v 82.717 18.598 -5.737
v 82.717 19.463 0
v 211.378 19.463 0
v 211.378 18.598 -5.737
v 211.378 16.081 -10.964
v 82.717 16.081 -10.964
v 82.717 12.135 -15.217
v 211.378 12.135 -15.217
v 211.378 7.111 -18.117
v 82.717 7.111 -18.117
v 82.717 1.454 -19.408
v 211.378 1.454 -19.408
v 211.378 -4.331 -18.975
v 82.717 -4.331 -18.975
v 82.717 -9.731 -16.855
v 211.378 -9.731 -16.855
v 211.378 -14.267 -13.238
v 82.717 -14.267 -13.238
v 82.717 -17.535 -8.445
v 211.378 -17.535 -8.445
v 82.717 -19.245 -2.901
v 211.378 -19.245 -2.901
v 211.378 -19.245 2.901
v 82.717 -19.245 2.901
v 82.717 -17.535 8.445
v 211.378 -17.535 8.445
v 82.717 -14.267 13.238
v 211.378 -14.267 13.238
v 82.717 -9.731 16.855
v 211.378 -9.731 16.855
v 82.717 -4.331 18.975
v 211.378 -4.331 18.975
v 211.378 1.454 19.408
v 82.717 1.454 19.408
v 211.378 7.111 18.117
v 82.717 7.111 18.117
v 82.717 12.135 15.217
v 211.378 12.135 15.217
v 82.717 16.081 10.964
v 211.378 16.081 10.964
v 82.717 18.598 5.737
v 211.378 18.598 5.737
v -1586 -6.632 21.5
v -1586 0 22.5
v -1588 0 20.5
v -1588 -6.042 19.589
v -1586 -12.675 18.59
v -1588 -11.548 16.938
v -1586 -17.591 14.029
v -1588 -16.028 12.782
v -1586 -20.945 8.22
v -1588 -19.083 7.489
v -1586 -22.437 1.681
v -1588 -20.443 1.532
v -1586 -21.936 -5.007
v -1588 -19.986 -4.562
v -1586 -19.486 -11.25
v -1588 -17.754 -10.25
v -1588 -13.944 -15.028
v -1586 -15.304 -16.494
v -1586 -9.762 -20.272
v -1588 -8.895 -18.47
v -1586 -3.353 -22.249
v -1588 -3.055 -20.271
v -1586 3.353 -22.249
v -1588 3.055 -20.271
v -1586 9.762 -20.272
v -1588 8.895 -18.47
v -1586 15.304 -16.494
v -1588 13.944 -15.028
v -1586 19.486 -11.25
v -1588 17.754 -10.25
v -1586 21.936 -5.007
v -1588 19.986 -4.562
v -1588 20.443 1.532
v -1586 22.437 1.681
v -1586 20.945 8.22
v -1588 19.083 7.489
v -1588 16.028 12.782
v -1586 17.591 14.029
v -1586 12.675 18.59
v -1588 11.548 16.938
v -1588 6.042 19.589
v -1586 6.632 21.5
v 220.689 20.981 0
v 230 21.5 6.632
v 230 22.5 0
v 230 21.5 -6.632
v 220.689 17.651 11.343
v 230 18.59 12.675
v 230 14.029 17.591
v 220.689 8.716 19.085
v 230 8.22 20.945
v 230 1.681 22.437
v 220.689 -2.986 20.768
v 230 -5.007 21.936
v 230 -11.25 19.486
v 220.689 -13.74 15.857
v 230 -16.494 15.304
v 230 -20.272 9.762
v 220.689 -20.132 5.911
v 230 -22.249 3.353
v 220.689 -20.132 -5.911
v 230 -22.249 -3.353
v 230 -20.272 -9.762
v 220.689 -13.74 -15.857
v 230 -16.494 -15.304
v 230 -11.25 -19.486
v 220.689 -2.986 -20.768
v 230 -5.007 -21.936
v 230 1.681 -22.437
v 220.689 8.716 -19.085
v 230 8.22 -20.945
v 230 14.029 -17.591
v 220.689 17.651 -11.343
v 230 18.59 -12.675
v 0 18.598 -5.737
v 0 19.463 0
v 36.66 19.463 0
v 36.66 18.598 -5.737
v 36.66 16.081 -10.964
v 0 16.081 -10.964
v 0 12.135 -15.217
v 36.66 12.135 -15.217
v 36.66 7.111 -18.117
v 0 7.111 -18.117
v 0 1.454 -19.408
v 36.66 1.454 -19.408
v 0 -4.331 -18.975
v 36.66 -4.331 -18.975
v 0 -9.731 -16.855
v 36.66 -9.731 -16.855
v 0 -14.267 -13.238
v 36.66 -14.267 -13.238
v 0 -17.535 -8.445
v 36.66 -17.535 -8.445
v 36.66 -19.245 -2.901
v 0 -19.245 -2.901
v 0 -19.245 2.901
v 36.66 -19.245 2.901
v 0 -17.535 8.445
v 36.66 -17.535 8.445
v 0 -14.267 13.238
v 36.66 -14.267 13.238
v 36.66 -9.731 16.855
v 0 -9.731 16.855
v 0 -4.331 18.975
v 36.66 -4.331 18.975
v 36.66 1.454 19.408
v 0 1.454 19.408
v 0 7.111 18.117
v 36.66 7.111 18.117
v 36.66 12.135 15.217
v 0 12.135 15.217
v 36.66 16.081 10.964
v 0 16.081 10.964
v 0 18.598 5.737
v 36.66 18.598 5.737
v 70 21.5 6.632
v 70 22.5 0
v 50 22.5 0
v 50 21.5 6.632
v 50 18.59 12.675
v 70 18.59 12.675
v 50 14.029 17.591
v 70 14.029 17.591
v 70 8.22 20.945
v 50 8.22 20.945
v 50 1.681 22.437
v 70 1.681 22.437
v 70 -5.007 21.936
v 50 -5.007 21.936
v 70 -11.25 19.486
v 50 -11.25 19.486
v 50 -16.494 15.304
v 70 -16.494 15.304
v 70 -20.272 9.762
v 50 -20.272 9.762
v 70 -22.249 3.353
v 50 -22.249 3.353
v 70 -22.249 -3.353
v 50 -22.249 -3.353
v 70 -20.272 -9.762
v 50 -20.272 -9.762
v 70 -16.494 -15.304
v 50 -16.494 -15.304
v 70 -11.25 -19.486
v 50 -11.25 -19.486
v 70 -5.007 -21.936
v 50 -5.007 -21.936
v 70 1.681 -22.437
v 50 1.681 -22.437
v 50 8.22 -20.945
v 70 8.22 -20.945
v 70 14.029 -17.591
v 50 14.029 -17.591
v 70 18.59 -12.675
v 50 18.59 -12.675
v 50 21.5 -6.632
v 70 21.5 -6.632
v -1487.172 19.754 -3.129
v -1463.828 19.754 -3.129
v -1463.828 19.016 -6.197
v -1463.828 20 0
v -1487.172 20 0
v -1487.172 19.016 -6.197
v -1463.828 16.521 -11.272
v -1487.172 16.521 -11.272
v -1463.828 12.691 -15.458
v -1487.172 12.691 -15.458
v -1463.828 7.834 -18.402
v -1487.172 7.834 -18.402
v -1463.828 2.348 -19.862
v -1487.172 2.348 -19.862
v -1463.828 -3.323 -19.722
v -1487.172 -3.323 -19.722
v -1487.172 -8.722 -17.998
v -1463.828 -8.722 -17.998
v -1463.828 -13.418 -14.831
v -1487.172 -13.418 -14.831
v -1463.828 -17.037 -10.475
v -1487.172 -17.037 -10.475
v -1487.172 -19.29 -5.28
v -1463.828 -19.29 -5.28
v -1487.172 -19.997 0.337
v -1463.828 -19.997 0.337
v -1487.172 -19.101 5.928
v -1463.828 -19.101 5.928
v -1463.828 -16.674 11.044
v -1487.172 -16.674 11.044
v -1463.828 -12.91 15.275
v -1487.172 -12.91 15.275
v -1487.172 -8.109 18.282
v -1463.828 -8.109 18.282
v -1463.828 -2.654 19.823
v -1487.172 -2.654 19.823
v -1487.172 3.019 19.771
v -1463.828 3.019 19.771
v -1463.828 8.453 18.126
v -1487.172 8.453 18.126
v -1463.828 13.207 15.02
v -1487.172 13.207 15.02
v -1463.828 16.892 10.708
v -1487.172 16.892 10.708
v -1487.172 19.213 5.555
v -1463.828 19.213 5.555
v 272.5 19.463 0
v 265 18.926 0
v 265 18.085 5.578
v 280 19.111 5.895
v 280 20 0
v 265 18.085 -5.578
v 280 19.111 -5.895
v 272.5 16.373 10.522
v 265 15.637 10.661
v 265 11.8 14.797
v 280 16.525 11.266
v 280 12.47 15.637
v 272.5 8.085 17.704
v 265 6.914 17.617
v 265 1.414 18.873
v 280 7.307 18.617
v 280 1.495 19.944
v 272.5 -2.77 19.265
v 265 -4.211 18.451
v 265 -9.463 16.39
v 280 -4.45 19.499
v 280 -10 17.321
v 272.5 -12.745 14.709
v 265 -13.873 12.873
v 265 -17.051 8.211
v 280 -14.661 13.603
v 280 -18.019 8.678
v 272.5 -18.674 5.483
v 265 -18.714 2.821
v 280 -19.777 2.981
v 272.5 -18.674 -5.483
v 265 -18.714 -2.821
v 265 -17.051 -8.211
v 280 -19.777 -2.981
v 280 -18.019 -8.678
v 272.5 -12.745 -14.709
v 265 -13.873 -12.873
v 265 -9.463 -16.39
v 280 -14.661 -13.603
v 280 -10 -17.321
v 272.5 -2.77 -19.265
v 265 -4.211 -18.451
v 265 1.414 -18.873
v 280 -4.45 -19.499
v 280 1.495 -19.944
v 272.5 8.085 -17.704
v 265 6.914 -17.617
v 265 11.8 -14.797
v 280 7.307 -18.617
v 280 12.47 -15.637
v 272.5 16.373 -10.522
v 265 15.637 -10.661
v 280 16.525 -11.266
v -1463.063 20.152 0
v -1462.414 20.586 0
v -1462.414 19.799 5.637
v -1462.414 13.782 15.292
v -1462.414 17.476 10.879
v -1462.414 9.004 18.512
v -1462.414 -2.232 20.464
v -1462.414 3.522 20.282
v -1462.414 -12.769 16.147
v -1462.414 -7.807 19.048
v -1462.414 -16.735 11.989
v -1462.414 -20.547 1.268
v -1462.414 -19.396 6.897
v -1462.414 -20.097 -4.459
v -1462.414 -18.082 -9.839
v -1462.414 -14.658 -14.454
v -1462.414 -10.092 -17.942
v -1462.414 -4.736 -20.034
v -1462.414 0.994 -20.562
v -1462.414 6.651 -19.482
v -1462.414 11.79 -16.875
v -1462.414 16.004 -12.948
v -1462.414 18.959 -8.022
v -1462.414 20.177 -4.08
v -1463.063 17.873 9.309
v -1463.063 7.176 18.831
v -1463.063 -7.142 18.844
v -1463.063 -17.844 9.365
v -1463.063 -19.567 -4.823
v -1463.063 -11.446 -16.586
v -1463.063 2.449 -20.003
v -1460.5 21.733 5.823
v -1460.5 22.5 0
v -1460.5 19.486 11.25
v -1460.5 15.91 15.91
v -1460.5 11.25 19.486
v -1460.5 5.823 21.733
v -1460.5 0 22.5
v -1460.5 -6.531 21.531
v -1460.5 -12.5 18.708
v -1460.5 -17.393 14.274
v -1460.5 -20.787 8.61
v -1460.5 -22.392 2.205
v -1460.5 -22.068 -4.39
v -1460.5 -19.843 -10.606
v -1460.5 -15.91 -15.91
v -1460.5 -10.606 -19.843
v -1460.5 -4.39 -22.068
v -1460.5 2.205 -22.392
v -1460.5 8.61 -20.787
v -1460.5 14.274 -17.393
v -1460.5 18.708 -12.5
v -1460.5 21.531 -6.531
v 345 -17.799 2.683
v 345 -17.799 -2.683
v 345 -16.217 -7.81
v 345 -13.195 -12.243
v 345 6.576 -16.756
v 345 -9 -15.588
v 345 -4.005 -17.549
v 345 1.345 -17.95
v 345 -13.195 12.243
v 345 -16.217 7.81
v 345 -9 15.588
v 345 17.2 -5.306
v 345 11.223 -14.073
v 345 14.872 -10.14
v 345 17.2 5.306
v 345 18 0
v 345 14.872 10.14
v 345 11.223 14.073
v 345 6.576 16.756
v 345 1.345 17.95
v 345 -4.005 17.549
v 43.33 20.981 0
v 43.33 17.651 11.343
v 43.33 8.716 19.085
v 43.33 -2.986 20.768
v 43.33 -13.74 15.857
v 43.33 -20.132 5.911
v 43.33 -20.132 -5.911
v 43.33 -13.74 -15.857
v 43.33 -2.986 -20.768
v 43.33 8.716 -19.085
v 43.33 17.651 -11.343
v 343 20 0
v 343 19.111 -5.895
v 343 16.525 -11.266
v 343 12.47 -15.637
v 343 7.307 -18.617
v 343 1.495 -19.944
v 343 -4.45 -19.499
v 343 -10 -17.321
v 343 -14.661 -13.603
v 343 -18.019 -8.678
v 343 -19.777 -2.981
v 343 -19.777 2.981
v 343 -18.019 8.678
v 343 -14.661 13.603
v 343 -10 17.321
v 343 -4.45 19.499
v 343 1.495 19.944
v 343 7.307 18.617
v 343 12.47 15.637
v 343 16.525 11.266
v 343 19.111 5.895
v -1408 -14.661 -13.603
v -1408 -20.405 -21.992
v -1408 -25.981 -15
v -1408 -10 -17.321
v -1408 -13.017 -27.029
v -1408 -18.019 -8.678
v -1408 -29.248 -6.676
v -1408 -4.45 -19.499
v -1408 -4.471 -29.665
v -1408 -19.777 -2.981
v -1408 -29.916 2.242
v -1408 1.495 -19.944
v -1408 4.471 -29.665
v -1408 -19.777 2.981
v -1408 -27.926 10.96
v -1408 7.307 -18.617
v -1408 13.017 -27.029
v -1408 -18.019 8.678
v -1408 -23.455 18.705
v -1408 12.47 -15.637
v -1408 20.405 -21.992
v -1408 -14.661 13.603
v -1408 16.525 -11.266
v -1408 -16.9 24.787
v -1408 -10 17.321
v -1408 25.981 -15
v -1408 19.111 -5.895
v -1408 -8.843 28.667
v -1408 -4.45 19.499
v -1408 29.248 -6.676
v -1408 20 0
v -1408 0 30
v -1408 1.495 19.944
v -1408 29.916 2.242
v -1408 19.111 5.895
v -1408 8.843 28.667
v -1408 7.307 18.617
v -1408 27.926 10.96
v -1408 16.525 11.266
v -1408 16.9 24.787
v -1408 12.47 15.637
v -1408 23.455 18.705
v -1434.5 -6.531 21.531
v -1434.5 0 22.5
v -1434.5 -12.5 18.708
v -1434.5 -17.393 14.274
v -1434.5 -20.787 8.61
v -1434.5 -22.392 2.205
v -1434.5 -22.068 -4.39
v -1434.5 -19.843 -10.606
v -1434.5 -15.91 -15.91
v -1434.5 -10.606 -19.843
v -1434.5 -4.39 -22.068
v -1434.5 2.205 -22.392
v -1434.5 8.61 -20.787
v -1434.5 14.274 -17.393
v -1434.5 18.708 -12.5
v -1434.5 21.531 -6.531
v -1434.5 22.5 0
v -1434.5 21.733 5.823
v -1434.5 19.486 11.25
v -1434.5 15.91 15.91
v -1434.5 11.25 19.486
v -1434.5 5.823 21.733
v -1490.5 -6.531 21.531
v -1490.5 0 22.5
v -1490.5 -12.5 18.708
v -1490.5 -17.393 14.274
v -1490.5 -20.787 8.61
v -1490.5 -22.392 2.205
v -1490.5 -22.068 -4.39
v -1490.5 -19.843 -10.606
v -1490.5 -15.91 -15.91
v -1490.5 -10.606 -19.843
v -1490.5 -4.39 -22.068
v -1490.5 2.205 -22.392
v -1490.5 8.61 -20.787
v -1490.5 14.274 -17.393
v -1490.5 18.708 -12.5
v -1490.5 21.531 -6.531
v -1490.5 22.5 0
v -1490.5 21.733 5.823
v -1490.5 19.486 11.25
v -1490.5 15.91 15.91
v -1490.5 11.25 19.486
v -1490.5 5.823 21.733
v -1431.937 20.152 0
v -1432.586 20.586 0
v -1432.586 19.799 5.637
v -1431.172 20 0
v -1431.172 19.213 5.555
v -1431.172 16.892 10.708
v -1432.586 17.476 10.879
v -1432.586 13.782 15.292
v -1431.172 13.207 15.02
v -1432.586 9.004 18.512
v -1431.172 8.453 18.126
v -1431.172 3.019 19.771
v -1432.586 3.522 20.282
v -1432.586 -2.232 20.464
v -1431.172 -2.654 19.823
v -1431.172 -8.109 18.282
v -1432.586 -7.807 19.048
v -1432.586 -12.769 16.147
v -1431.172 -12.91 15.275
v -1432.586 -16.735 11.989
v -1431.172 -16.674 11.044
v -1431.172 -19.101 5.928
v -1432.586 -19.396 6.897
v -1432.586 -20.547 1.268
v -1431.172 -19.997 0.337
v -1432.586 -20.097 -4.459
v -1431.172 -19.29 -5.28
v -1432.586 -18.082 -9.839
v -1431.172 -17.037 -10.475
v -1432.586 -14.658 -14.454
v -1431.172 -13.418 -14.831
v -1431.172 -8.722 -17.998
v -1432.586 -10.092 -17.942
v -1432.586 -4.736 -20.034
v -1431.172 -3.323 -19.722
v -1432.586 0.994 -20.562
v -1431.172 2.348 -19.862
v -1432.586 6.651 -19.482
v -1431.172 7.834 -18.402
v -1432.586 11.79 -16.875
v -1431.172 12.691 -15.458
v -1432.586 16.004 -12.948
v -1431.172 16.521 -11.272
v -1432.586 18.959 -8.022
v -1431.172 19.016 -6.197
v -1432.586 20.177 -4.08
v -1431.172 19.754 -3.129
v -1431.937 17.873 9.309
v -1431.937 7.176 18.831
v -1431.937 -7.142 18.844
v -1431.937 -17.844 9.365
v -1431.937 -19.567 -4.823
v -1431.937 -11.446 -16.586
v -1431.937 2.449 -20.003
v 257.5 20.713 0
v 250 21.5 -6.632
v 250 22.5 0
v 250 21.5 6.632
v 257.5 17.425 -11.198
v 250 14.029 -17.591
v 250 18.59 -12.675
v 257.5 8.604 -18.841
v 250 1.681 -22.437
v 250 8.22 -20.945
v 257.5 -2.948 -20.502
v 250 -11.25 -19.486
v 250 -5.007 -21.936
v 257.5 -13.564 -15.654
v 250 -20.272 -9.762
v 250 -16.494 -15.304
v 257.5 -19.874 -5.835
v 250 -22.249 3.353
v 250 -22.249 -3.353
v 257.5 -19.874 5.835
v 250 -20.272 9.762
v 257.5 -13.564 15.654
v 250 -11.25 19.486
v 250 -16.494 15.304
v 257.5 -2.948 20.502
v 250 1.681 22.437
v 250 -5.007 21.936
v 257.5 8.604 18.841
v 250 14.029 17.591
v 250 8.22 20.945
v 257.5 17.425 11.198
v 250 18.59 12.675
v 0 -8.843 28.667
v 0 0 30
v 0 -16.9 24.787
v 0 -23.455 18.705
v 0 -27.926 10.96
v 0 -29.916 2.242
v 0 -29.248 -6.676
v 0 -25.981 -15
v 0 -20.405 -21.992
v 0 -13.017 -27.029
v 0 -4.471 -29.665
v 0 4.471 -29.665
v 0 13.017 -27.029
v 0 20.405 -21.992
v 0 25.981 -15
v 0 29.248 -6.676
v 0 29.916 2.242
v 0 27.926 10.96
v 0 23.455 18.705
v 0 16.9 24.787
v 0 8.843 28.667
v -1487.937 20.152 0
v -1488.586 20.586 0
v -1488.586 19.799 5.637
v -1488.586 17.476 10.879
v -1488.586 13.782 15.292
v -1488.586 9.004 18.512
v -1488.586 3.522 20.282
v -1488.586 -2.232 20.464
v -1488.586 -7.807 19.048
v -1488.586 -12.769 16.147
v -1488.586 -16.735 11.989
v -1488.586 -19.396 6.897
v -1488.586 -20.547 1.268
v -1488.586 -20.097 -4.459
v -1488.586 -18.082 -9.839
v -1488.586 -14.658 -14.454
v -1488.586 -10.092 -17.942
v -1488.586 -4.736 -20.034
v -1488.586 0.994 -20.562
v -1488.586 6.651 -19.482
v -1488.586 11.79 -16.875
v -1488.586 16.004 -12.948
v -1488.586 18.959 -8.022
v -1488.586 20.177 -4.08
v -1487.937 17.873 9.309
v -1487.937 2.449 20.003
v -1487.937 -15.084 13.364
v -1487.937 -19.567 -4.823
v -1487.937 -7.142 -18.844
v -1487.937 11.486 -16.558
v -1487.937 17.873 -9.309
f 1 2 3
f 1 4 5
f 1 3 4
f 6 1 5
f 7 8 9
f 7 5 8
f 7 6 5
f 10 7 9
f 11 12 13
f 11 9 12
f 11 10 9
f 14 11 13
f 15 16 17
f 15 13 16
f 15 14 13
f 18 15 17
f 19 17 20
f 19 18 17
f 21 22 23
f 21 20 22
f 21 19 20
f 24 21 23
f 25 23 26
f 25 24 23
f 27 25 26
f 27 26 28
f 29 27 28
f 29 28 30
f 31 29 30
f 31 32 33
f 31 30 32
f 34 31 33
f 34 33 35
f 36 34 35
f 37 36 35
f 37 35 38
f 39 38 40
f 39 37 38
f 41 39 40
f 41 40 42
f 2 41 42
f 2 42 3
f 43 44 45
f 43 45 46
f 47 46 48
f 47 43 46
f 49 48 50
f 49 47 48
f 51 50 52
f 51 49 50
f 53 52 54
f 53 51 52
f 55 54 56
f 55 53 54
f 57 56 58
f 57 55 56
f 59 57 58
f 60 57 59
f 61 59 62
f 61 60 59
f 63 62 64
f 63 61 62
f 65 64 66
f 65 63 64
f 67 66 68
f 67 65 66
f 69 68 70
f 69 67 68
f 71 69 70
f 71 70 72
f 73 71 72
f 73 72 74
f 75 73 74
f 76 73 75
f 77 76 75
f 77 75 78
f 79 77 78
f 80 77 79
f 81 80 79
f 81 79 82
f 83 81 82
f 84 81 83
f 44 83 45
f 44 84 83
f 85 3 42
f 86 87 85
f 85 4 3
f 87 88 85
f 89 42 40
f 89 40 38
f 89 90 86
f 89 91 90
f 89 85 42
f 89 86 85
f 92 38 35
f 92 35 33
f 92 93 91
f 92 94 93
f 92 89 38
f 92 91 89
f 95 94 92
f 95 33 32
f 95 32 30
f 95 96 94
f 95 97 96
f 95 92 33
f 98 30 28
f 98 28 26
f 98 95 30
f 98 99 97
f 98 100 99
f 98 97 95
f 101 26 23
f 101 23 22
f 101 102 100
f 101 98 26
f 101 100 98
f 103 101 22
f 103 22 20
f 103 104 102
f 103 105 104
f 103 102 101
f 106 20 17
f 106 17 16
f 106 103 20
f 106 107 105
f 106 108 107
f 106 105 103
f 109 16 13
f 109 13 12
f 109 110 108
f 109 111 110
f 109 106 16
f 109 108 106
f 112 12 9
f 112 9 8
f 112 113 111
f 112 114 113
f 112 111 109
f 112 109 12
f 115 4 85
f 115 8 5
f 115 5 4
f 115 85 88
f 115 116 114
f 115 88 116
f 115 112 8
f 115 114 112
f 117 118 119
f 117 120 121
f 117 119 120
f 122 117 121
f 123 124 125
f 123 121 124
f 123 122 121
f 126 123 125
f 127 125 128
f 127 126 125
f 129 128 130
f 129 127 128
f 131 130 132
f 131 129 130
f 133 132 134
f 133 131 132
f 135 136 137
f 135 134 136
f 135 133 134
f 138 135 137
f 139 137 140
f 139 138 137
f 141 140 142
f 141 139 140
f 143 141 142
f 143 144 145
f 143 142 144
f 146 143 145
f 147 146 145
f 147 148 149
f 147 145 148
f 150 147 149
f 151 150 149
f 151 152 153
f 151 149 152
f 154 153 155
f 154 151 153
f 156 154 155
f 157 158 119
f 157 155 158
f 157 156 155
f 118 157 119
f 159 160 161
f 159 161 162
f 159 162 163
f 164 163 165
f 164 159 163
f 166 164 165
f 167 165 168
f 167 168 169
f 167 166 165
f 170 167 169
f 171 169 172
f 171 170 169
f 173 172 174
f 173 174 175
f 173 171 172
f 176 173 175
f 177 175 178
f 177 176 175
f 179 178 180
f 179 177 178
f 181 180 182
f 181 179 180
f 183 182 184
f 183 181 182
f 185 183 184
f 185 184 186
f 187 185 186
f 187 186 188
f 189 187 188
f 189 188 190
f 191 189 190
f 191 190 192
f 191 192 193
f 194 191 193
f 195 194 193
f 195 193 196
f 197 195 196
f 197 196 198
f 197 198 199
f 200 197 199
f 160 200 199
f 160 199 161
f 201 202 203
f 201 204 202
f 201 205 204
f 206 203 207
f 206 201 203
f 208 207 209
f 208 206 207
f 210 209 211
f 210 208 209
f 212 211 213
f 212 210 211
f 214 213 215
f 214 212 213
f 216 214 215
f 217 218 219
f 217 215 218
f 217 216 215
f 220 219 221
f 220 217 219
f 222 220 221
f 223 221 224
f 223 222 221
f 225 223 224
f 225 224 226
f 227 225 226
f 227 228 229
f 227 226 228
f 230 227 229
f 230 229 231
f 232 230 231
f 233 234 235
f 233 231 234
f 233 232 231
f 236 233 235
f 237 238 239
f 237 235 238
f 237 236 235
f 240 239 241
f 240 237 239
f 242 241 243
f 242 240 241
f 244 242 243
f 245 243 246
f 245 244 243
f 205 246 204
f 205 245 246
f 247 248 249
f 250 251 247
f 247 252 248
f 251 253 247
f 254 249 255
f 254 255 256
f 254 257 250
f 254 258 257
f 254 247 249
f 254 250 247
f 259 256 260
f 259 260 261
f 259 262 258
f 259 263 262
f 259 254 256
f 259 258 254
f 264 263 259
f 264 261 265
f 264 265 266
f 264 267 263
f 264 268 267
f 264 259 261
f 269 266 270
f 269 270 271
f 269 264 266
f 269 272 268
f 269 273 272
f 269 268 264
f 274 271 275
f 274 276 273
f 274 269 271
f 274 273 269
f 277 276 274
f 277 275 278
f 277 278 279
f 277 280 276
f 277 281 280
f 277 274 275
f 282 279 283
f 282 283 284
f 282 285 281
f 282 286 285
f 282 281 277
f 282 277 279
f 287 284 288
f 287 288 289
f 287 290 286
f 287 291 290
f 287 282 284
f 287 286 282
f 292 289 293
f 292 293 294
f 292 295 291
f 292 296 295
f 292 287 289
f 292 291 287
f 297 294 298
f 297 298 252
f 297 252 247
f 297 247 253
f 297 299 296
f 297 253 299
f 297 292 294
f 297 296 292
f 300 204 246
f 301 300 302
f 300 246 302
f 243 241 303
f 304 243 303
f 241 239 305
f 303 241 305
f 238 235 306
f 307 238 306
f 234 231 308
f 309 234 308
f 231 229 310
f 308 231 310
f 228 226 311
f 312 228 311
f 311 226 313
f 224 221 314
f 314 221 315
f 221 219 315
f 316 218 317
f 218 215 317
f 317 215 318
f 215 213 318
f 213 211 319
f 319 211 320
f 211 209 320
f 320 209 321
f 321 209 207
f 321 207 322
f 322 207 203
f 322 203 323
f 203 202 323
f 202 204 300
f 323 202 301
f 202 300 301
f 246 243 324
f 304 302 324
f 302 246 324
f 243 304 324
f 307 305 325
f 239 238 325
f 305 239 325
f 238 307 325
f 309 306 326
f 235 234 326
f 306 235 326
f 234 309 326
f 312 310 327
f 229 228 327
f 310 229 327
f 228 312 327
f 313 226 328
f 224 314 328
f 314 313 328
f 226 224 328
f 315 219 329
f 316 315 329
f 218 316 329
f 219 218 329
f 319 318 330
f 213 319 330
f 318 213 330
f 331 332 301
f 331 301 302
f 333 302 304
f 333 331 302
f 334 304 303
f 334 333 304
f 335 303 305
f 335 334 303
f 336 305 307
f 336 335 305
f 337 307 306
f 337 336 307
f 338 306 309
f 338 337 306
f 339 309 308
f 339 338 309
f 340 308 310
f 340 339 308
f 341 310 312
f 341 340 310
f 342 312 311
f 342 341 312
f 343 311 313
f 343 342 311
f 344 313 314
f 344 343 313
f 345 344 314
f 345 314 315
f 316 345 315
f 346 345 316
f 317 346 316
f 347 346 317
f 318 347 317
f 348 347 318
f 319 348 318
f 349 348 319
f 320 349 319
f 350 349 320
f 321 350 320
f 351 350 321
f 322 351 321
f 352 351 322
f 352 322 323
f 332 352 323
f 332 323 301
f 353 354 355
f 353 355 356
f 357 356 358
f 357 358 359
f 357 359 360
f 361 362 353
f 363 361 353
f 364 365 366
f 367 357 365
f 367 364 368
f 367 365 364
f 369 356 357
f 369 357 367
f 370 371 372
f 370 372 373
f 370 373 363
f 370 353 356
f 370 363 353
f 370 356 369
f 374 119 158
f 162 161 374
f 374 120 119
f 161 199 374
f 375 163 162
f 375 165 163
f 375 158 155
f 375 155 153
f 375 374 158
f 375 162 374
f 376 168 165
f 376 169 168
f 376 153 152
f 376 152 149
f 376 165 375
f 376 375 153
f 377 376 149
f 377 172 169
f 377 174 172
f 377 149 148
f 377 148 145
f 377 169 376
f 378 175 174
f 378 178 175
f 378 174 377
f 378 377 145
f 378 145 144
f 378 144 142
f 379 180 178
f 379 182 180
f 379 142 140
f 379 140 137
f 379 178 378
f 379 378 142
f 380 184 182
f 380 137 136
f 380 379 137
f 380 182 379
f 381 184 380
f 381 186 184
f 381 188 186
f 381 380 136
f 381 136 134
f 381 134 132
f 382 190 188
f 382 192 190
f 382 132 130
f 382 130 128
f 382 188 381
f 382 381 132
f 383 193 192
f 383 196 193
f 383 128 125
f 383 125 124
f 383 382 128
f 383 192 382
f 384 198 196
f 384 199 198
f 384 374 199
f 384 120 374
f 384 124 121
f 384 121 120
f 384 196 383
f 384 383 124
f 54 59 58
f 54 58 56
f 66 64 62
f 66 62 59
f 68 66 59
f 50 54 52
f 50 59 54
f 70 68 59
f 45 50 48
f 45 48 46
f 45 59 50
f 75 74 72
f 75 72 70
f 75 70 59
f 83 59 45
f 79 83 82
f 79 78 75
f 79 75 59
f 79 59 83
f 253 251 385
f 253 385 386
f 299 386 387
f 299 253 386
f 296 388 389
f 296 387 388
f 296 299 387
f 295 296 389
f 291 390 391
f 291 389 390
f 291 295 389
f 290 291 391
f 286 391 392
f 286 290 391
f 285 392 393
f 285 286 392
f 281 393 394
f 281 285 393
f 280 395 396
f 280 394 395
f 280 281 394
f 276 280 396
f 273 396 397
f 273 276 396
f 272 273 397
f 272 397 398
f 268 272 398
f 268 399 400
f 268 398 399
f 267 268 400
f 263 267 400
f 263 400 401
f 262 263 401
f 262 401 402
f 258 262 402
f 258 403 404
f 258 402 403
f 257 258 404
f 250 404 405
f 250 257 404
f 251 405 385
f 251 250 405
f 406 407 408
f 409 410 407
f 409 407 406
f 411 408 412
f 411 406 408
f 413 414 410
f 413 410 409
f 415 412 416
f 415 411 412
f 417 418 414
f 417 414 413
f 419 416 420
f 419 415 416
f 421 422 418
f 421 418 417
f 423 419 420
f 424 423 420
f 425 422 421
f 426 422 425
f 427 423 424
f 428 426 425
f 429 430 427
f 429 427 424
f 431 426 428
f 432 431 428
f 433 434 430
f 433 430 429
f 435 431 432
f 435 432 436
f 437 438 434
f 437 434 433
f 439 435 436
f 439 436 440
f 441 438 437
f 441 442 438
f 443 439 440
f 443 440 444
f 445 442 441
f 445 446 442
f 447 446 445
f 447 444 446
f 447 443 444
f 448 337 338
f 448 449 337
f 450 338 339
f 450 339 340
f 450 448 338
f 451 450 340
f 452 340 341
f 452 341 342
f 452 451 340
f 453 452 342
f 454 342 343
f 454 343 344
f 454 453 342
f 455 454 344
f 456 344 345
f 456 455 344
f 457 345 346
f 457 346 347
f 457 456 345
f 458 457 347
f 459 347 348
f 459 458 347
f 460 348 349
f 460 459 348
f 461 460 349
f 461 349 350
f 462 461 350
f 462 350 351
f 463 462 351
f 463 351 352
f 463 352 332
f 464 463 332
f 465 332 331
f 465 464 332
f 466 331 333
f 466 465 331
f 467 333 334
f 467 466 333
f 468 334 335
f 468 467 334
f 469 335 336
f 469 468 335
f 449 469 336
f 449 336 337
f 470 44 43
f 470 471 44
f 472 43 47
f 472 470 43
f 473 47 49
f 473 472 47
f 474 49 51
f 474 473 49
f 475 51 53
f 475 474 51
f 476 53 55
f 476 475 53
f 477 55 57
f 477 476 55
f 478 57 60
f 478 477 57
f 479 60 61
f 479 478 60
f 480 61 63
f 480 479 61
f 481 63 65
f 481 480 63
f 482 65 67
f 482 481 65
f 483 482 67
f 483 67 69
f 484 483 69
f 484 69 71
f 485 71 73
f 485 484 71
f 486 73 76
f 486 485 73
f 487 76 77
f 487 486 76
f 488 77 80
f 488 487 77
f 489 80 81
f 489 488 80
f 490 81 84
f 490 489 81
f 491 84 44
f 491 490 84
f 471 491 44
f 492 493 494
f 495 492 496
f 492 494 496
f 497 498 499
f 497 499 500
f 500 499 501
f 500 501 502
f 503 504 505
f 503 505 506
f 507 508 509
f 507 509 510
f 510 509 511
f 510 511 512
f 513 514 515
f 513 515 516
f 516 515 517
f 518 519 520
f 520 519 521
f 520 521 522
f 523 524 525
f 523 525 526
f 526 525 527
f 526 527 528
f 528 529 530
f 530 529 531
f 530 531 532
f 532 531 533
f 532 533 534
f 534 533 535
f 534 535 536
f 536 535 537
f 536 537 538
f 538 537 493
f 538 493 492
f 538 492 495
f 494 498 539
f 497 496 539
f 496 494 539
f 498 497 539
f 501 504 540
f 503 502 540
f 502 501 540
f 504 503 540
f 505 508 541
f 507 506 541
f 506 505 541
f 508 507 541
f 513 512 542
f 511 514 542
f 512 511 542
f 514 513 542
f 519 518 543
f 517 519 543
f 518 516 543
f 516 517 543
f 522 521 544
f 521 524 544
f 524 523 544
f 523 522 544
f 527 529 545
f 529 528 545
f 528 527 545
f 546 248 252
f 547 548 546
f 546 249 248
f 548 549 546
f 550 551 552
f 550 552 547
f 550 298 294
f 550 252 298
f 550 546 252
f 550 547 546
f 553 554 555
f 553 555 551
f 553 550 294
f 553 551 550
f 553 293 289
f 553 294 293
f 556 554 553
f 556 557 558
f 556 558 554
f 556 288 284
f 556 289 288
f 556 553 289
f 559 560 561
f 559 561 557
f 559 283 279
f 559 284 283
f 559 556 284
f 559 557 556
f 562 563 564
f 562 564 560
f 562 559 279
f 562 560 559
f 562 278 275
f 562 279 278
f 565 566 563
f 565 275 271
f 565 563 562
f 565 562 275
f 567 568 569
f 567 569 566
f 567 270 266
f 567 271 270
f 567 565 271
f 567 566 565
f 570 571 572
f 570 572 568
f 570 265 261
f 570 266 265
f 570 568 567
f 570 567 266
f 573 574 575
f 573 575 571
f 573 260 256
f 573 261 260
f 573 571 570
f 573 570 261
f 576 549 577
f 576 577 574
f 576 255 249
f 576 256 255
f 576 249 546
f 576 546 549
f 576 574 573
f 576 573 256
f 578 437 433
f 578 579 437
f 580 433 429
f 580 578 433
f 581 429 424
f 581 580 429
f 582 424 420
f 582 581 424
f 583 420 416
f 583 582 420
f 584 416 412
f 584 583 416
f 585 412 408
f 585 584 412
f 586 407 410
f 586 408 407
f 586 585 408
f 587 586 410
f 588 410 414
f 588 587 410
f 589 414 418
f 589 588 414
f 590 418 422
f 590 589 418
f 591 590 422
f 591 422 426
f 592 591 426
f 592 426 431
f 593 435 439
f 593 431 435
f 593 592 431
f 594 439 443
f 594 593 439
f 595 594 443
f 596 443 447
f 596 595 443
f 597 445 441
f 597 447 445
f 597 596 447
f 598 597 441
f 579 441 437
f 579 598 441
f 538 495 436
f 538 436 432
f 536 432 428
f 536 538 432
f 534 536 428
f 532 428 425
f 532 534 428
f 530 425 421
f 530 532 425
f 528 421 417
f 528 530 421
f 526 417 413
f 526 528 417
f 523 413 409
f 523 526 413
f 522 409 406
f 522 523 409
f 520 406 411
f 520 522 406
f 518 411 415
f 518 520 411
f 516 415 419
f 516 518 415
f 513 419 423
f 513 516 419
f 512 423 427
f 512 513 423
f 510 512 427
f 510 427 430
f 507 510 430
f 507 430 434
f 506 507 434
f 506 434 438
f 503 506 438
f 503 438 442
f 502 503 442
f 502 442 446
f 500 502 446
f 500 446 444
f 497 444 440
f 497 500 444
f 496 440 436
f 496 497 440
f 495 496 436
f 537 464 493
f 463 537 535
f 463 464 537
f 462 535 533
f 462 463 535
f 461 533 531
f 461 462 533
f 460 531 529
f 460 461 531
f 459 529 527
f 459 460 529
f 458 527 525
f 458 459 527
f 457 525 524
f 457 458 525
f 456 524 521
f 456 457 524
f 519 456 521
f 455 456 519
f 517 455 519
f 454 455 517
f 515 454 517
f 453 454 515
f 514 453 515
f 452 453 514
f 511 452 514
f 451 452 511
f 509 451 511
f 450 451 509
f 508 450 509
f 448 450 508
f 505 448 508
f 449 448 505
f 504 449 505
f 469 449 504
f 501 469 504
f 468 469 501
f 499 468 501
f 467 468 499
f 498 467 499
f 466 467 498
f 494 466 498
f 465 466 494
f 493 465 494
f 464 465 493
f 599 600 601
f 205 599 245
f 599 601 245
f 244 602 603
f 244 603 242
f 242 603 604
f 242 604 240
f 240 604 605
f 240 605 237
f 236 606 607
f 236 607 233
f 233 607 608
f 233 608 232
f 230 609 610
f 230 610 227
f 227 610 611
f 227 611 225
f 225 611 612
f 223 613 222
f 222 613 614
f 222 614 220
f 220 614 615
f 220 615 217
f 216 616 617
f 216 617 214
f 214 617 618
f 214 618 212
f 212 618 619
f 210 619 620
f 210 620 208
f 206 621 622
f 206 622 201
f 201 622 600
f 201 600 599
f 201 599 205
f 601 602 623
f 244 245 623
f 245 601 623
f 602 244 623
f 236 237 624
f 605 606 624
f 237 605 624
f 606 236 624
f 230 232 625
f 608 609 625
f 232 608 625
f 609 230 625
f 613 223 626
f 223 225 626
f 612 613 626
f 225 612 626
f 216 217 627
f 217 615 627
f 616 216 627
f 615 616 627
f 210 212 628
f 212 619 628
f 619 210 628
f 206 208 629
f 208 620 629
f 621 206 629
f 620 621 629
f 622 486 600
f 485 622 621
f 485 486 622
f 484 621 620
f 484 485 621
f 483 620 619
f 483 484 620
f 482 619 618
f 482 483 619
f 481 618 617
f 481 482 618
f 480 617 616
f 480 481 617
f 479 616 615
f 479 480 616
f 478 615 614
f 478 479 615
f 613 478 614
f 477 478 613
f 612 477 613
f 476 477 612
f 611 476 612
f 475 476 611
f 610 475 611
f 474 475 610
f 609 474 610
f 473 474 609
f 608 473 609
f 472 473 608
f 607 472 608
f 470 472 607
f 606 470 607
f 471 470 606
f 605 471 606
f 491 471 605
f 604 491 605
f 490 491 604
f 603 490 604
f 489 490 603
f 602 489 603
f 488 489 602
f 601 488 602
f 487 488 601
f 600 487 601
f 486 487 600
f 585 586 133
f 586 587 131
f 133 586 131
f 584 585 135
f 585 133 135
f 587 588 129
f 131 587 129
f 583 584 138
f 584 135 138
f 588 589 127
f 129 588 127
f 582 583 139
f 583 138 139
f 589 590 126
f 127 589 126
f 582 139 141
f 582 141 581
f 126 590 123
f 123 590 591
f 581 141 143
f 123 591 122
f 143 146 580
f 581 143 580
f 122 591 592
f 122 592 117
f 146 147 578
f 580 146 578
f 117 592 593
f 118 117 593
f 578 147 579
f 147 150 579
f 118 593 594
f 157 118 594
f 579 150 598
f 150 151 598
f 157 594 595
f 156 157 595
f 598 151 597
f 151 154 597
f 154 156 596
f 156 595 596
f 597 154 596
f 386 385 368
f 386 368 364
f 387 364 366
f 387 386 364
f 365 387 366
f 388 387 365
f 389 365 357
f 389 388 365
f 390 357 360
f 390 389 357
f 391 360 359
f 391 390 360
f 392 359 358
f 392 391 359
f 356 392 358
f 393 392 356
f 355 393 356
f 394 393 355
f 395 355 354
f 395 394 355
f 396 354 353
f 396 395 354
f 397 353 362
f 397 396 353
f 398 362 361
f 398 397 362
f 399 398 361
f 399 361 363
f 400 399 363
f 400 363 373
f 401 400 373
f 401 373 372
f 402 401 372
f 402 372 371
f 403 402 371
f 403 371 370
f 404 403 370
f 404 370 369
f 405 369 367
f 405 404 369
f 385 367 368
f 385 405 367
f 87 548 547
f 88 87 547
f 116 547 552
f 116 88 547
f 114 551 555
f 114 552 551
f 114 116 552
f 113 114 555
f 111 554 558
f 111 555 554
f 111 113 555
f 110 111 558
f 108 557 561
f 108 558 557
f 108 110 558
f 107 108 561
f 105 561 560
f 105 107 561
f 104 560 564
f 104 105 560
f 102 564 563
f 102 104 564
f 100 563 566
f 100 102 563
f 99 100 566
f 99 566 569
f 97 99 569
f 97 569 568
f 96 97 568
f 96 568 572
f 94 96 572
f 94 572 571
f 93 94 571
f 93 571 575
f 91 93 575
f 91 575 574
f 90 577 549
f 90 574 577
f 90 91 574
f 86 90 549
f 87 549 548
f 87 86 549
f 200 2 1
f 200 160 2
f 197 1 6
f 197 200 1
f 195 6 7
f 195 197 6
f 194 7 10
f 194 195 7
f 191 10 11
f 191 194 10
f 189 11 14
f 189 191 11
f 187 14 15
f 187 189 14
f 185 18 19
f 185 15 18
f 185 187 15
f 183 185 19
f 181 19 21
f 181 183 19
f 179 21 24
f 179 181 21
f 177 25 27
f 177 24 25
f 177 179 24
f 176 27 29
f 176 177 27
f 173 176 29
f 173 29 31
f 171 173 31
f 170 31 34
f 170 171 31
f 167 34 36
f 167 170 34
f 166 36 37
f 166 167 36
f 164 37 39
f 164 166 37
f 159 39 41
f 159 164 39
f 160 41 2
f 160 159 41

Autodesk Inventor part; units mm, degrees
ref_plane "YZ Plane" through (0, 0, 0) normal (1, 0, 0) x (0, 1, 0)
ref_plane "XZ Plane" through (0, 0, 0) normal (0, 1, 0) x (-1, 0, 0)
ref_plane "XY Plane" through (0, 0, 0) normal (0, 0, 1) x (1, 0, 0)
sketch "Эскиз1" plane through (0, 0, 0) normal (0, 0, 1) x (1, 0, 0)
  line L0 (0, 0) -> (345, 0)
  line L1 (345, 0) -> (345, 20)
  line L2 (345, 20) -> (280, 20)
  line L3 (0, 0) -> (0, 22.5)
  line L4 (0, 22.5) -> (50, 22.5)
  line L5 (50, 22.5) -> (70, 22.5)
  line L6 (250, 22.5) -> (230, 22.5)
  line L7 (250, 22.5) -> (265, 18.9255)
  line L8 (265, 18.9255) -> (280, 20)
  line L9 (82.7171, 19.4628) -> (70, 22.5)
  line L10 (50, 22.5) -> (36.6597, 19.4628)
  line L11 (36.6597, 19.4628) -> (0, 19.4628)
  line L12 (230, 22.5) -> (211.3782, 19.4628)
  line L13 (211.3782, 19.4628) -> (82.7171, 19.4628)
  dimension "d0" = 345
  dimension "d1" = 20
  dimension "d2" = 65
  dimension "d5" = 22.5
  dimension "d6" = 50
  dimension "d7" = 20
  dimension "d8" = 20
  dimension "d15" = 30
revolve "Вращение1" add sketch "Эскиз1" angle 360 about axis through (0, 0, 0) along (1, 0, 0) contours L3 L11 L10 L5 L9 L13 L12 L6 L7 L8 L2 L1 L0
thread "Резьба1" size "M40x3" class "6g" standard "ANSI Metric M Profile" full length
sketch "Эскиз2" plane through (0, 0, 0) normal (-1, 0, 0) x (0, 0, 1)
  circle A0 centre (0, 0) radius 30
  dimension "d12" = 60
extrude "Выдавливание1" add sketch "Эскиз2" along normal blind 1408
sketch "Эскиз3" plane through (-1408, 0, 0) normal (-1, 0, 0) x (0, 0, 1)
  circle A0 centre (0, 0) radius 22.5
  dimension "d16" = 45
extrude "Выдавливание2" add sketch "Эскиз3" along normal blind 180
sketch "Эскиз4" plane through (0, 0, 0) normal (0, 0, 1) x (1, 0, 0)
  line L0 (-1408, 30) -> (-1408, -30) projected
  line L1 (-1588, 22.5) -> (-1588, -22.5) projected
  line L2 (-1408, -22.5) -> (-1408, 22.5) projected
  line L3 (-1408, 22.5) -> (-1588, 22.5) projected
  line L4 (-1588, 22.5) -> (-1588, -22.5) projected
  line L5 (-1656, 0) -> (-1640, 0)
  line L6 (-1541, 22.5) -> (-1633, 22.5)
  line L7 (-1408, 22.5) -> (-1588, 22.5) projected
  line L8 (-1408, 0) -> (-1408, 20)
  line L9 (-1408, 20) -> (-1432, 20)
  line L10 (-1432, 20) -> (-1434.5, 22.5)
  line L11 (-1408, 22.5) -> (-1588, 22.5) projected
  line L12 (-1434.5, 22.5) -> (-1460.5, 22.5)
  line L13 (-1408, 22.5) -> (-1588, 22.5) projected
  line L14 (-1460.5, 22.5) -> (-1463, 20)
  line L15 (-1463, 20) -> (-1488, 20)
  line L16 (-1488, 20) -> (-1490.5, 22.5)
  line L17 (-1408, 22.5) -> (-1588, 22.5) projected
  line L18 (-1408, 22.5) -> (-1408, 20)
  line L19 (-1490.5, 22.5) -> (-1408, 22.5)
  dimension "d26" = 135
  dimension "d27" = 26
revolve "Вращение2" cut sketch "Эскиз4" angle 360 about axis through (-1656, 0, 0) along (1, 0, 0)
chamfer "Фаска1" distance 2 angle 45 1 edges at (-1588, 0, -22.5)
fillet "Сопряжение1" radius 2 3 edges at (-1488, -20, 0) (-1463, -20, 0) (-1432, -20, 0)
thread "Резьба2" size "M45x4.5" class "6g" standard "ANSI Metric M Profile" full length
chamfer "Фаска2" distance 2 angle 45 1 edges at (345, -20, 0)
properties part number "Шток" material "Сталь, углеродистая"
